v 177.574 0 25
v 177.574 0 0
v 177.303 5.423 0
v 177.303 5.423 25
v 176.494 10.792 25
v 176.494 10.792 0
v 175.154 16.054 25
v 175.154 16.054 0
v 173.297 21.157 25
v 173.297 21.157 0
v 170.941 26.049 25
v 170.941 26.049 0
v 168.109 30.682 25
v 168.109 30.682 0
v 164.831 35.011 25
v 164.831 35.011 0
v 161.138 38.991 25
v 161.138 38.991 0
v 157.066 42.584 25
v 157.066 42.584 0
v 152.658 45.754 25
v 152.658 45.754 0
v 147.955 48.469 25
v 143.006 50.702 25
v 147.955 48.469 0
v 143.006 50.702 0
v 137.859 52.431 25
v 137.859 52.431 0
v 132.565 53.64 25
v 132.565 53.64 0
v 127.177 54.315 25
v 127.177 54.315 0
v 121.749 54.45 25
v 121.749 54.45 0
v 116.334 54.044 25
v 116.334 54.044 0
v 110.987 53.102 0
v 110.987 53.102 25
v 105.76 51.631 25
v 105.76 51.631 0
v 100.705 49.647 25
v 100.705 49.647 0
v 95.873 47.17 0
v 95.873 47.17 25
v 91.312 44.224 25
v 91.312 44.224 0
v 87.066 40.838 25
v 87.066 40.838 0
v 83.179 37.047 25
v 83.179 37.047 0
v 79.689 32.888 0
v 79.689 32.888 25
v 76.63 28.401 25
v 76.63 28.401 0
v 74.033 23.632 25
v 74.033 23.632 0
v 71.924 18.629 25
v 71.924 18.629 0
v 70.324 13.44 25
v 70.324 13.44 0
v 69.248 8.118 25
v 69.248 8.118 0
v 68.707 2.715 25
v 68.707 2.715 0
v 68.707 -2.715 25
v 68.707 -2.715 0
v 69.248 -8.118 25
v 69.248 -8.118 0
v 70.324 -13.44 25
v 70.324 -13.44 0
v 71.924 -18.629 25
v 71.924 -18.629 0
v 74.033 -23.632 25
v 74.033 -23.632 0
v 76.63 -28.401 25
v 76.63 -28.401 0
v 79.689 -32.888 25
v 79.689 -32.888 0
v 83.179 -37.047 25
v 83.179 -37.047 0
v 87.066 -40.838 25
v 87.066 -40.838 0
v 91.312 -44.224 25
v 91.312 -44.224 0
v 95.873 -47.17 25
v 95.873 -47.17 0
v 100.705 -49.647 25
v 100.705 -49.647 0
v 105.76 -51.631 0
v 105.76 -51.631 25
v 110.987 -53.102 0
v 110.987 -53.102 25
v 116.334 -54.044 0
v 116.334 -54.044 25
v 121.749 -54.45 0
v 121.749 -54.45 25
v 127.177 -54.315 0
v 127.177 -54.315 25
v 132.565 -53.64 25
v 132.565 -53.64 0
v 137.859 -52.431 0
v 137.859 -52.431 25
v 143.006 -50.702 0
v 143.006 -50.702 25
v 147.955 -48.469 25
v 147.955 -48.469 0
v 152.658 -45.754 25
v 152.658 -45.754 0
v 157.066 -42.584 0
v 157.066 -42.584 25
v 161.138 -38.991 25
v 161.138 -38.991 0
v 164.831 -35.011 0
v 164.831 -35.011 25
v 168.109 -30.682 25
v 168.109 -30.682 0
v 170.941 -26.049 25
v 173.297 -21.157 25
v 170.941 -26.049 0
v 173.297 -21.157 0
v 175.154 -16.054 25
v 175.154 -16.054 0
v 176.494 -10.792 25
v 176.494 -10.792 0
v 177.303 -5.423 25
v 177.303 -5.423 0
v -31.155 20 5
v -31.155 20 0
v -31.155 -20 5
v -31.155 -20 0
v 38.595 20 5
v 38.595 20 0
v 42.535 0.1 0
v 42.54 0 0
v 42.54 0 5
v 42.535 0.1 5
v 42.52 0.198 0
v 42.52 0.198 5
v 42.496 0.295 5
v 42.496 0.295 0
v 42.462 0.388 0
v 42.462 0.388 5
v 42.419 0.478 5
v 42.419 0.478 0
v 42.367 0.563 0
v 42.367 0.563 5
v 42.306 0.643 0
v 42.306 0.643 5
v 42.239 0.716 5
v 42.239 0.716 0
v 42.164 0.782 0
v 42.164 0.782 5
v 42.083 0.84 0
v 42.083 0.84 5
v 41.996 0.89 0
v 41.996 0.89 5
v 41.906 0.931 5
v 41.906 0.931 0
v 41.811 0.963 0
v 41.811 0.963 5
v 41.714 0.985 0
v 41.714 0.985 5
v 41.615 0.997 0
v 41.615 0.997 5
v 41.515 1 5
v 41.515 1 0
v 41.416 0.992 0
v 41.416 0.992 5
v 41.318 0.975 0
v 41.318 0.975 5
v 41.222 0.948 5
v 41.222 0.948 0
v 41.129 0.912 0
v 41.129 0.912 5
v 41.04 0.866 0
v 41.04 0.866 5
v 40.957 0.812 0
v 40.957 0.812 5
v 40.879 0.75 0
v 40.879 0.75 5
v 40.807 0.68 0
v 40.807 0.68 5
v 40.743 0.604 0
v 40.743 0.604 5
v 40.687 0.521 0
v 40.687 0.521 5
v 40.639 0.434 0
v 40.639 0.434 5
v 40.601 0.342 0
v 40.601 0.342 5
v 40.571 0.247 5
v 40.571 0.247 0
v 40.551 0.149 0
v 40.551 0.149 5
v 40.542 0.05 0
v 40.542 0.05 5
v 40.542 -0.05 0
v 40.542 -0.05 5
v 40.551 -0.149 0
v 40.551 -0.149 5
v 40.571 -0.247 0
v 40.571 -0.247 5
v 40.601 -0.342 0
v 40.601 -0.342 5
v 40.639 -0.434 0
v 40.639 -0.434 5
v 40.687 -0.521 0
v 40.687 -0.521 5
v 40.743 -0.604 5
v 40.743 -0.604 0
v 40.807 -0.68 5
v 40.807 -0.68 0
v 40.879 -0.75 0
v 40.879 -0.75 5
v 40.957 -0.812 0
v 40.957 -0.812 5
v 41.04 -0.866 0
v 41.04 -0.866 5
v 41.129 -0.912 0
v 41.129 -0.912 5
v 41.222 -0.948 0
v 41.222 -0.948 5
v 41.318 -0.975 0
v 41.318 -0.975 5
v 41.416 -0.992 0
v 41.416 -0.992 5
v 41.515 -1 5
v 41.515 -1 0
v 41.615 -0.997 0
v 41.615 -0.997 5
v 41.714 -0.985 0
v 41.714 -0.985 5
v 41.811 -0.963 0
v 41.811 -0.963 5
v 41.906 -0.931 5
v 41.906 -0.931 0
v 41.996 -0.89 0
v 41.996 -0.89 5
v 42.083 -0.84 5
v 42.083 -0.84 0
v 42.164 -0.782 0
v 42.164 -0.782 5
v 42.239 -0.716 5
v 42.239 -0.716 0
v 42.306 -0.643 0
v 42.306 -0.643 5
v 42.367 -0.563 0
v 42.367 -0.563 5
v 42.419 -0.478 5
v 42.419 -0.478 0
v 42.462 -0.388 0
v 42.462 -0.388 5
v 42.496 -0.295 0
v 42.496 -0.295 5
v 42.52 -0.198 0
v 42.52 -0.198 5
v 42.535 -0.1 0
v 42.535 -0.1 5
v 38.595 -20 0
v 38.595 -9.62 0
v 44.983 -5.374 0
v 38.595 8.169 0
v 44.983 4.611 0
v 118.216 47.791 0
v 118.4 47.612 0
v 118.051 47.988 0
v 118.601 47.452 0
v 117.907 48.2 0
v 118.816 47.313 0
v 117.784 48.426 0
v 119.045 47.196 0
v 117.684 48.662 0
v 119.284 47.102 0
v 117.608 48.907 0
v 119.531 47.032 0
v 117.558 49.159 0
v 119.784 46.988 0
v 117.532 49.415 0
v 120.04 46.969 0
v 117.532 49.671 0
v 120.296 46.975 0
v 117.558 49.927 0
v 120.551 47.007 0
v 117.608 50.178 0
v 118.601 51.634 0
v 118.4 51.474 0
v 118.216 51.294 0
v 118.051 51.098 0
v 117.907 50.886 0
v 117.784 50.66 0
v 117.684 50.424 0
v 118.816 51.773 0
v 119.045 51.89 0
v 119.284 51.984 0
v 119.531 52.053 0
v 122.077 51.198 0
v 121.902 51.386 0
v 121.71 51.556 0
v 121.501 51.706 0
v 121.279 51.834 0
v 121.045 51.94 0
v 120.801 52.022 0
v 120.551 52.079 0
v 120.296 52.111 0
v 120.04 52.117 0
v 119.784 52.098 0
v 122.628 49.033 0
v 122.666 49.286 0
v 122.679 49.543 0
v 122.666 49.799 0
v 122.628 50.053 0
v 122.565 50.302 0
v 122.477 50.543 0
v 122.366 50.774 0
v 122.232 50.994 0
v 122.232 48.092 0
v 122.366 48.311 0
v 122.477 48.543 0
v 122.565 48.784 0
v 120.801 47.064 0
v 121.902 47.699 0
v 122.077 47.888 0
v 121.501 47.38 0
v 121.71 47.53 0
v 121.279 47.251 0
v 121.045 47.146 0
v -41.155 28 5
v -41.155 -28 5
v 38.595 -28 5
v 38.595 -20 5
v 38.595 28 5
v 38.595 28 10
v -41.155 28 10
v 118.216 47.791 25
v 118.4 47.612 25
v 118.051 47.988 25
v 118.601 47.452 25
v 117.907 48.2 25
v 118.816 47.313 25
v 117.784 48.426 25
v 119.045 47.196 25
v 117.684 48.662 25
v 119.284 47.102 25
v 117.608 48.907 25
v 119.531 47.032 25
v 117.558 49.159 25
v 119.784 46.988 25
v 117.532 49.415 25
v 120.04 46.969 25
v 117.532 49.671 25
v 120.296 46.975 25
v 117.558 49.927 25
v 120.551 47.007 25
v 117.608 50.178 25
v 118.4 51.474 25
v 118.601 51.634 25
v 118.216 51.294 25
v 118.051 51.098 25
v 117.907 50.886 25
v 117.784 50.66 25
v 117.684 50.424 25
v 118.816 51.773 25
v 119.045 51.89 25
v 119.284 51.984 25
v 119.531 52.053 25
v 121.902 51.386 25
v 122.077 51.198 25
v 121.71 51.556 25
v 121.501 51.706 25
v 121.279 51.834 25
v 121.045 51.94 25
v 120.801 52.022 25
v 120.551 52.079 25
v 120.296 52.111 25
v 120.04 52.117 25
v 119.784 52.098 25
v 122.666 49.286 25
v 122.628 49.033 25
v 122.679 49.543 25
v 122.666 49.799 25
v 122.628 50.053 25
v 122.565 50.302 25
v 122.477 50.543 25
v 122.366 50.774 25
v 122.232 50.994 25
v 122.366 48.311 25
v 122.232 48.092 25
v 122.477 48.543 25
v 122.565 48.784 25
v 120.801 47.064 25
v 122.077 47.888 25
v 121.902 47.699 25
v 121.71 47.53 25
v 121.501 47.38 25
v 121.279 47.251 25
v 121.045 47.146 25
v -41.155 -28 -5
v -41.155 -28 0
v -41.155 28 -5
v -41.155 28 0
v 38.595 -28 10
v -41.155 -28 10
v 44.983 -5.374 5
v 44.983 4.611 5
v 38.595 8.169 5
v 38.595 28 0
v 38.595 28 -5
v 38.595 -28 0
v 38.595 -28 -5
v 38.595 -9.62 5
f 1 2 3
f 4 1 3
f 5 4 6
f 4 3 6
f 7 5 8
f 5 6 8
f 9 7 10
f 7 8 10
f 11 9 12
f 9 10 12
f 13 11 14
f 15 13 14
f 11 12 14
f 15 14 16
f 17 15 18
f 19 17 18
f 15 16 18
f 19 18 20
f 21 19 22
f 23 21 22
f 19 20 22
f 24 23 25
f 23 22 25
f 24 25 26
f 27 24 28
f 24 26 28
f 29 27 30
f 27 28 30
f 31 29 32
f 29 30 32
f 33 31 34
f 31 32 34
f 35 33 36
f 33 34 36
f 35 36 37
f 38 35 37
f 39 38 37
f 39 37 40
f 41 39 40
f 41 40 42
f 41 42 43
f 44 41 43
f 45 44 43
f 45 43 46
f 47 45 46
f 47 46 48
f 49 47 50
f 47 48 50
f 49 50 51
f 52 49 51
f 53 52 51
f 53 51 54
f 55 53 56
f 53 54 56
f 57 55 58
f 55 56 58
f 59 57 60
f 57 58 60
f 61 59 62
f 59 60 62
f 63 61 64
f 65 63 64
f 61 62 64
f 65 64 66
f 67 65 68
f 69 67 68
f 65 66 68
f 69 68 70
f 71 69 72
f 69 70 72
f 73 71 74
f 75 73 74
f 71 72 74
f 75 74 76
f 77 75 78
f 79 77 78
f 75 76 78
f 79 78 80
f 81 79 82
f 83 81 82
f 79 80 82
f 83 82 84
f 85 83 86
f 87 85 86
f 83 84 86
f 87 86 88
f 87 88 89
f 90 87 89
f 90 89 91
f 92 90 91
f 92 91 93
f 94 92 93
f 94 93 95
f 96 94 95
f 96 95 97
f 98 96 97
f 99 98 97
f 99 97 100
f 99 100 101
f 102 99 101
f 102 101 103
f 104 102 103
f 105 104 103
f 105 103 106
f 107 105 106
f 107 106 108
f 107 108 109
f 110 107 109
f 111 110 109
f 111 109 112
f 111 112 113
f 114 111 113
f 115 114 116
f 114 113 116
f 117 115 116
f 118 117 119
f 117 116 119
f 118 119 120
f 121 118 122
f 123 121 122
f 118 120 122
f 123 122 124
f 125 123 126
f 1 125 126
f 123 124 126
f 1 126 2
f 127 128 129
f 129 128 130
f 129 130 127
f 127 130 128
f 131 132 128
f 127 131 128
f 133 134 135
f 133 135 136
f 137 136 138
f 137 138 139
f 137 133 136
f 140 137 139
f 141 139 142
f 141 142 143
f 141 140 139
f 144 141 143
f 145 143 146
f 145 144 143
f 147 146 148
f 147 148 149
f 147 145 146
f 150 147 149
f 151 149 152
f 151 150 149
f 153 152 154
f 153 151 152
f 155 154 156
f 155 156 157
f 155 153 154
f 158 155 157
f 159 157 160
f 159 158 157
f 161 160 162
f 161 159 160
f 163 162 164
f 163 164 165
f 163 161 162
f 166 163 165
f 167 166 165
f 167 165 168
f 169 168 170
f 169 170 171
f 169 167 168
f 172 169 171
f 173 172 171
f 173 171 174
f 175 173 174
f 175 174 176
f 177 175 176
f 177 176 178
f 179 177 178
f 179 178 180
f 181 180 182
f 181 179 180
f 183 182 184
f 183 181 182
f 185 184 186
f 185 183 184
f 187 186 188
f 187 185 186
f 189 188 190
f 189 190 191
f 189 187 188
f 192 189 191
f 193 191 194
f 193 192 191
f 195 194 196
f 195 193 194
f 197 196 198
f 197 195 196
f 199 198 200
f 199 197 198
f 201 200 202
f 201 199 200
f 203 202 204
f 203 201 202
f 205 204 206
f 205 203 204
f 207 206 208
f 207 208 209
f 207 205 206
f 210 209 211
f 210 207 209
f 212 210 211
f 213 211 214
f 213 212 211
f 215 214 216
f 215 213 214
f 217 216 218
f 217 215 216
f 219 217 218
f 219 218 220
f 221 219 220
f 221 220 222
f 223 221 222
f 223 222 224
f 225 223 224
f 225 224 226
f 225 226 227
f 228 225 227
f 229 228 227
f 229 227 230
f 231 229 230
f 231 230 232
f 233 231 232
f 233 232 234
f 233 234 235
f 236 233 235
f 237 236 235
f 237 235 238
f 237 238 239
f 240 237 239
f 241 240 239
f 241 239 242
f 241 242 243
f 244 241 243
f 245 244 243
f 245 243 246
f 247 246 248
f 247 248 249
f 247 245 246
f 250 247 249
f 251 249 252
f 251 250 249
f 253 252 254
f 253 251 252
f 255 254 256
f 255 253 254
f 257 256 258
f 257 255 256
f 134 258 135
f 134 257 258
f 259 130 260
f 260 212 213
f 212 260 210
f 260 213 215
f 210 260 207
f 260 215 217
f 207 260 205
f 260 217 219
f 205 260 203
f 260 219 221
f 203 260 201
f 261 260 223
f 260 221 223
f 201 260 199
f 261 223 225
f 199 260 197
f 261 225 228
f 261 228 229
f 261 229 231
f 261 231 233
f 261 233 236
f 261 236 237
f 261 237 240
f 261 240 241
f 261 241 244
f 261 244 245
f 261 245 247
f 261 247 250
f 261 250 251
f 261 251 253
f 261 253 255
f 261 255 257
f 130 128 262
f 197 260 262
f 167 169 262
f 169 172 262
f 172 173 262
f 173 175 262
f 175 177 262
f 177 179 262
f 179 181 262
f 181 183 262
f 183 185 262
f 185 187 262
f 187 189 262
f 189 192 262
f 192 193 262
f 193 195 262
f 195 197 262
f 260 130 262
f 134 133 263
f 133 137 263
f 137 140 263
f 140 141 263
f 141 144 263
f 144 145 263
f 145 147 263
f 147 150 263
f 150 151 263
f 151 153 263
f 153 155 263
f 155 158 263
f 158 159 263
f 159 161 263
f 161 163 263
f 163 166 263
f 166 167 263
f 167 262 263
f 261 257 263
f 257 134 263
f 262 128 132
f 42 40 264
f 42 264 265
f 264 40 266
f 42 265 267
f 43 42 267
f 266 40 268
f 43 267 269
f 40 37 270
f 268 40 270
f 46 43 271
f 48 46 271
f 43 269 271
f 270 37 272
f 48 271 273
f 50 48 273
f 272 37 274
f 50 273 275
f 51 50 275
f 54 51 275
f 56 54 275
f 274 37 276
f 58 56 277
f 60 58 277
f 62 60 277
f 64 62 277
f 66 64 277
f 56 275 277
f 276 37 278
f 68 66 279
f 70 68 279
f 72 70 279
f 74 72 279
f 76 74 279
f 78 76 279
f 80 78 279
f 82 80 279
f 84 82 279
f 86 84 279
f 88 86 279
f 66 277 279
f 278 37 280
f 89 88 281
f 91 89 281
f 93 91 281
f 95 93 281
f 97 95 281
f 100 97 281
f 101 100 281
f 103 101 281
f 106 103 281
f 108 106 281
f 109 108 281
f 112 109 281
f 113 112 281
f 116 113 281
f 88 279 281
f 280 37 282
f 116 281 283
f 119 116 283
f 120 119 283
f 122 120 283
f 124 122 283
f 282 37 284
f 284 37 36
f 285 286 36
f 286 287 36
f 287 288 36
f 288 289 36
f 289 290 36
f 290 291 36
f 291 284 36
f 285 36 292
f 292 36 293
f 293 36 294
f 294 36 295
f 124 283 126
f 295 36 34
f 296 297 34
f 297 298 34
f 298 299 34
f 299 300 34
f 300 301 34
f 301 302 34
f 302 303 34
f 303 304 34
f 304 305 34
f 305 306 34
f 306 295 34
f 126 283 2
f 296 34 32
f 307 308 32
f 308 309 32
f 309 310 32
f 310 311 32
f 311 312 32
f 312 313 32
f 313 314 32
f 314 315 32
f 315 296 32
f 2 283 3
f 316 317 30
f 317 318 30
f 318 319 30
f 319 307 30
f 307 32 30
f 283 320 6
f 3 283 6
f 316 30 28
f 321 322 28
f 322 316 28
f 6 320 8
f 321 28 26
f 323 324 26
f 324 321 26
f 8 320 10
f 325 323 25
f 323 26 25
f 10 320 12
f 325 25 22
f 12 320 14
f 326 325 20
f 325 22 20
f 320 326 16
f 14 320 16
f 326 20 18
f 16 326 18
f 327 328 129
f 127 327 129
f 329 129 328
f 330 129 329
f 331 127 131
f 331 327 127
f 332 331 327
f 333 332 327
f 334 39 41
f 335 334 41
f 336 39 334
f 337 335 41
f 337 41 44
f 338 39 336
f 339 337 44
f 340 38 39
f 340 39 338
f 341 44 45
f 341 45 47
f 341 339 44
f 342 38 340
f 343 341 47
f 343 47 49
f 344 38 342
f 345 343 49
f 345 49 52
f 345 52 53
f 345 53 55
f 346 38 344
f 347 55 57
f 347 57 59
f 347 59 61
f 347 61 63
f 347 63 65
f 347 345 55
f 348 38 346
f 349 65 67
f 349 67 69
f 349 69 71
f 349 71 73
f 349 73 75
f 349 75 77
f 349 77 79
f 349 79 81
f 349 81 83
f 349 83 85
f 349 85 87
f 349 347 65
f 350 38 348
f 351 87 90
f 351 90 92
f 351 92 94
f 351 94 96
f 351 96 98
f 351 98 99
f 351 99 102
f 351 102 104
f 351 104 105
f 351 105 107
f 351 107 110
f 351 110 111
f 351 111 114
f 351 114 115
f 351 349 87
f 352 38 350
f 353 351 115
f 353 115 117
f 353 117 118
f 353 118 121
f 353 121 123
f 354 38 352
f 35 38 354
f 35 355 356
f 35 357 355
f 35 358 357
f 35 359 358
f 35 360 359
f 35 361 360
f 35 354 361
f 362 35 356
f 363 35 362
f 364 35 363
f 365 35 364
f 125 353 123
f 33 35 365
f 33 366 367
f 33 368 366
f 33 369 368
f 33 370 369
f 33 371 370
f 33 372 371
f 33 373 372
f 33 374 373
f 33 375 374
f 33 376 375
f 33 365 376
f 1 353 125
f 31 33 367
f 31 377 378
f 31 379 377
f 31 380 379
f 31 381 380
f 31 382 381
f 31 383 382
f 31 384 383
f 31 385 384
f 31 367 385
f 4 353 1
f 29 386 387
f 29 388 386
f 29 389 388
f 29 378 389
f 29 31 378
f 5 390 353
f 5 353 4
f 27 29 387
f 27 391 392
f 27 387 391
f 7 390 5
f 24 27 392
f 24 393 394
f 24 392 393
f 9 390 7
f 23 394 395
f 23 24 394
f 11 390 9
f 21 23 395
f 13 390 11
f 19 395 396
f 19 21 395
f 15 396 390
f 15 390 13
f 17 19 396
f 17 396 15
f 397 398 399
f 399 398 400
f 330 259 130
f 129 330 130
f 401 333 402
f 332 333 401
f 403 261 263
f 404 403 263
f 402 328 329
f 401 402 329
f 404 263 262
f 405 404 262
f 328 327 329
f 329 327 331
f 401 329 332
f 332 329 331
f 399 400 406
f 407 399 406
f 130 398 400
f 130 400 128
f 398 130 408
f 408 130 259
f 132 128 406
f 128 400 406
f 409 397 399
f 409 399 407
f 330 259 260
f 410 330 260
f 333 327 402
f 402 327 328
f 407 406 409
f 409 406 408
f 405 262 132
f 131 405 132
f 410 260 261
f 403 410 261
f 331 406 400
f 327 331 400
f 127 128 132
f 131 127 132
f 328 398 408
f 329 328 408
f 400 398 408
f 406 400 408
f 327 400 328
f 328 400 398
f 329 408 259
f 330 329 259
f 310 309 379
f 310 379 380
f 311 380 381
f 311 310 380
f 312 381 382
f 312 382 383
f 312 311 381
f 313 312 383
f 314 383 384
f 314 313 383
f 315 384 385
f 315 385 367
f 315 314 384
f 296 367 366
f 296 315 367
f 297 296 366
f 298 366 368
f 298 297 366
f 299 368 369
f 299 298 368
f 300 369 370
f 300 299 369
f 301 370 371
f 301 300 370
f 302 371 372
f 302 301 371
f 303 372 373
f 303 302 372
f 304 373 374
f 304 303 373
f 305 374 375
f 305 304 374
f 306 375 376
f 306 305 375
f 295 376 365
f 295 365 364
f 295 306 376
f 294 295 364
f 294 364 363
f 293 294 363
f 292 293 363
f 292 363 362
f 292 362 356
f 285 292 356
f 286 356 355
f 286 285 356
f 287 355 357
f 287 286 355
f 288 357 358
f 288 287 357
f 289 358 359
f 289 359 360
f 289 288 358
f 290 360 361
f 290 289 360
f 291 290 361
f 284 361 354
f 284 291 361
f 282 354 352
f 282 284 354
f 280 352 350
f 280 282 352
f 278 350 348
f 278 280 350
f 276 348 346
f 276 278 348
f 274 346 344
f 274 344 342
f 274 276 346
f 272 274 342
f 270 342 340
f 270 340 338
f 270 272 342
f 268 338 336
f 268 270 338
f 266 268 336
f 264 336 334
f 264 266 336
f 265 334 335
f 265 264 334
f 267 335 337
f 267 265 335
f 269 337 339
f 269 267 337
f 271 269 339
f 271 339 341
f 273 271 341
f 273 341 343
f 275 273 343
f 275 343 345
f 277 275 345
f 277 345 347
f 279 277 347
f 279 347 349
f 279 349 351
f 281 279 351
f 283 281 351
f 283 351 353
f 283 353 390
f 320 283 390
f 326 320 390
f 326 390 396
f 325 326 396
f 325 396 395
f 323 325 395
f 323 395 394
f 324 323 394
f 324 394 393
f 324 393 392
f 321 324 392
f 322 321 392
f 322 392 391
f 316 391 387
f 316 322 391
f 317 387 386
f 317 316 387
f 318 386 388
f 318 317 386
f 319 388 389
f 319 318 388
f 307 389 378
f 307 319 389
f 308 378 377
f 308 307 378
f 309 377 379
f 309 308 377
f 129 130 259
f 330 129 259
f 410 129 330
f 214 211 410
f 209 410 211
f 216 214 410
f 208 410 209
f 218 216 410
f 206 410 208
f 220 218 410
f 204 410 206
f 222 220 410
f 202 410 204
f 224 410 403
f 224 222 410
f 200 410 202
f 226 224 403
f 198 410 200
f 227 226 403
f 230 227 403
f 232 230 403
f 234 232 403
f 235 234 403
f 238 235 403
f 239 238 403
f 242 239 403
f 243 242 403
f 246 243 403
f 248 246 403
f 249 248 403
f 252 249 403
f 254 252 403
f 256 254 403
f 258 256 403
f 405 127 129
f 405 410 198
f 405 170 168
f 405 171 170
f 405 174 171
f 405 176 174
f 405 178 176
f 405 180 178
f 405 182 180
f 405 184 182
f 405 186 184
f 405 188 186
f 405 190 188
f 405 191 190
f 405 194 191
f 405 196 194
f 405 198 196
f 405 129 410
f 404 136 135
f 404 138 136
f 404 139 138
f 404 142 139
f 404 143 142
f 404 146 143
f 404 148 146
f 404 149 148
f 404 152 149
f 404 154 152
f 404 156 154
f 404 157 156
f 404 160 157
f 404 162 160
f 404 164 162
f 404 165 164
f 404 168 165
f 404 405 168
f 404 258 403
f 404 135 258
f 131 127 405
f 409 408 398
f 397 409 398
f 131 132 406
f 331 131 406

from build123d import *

# Parameters (mm, degrees)
F0_R     = 1
F1_DEPTH = 5
F2_DEPTH = 5
F4_DEPTH = 5
F6_DEPTH = 5
F7_R     = 54.467191
F7_R_2   = 2.575131
F8_DEPTH = 25


with BuildPart() as f1:
    # F0 (on Top) → F1 (new body)
    with BuildSketch(Plane.XY):
        Polygon((38.59535, 20), (-31.154648, 20), (-31.154648, -20), (38.59535, -20), (38.59535, -9.620124), (38.59535, 8.16877), align=None)
        Polygon((44.983294, 4.610992), (38.59535, 8.16877), (38.59535, -9.620124), (44.983294, -5.373743), align=None)
        with Locations((41.54028, 0)):
            Circle(F0_R, mode=Mode.SUBTRACT)
    extrude(amount=F1_DEPTH)


with BuildPart() as f2:
    # F0 (on Top) → F2 (new body)
    with BuildSketch(Plane.XY):
        Polygon((-31.154648, -20), (-31.154648, 20), (38.59535, 20), (38.59535, 28), (-41.154651, 28), (-41.154651, -28), (38.59535, -28), (38.59535, -20), align=None)
    extrude(amount=F2_DEPTH)


with BuildPart() as f4:
    # F3 (on face) → F4 (new body)
    with BuildSketch(Plane(origin=(0, 0, 0), x_dir=(1, 0, 0), z_dir=(0, 0, -1))):
        Polygon((38.59535, 20), (38.59535, 28), (-41.154651, 28), (-41.154651, -28), (38.59535, -28), (38.59535, -20), align=None)
    extrude(amount=F4_DEPTH)


with BuildPart() as f6:
    # F5 (on face) → F6 (new body)
    with BuildSketch(Plane.XY.offset(5)):
        Polygon((-41.154651, 28), (-41.154651, -28), (38.59535, -28), (38.59535, -20), (38.59535, 20), (38.59535, 28), align=None)
    extrude(amount=F6_DEPTH)


with BuildPart() as f8:
    # F7 (on Top) → F8 (new body)
    with BuildSketch(Plane.XY):
        with Locations((123.106591, 0)):
            Circle(F7_R)
        with Locations((120.103993, 49.542896)):
            Circle(F7_R_2, mode=Mode.SUBTRACT)
    extrude(amount=F8_DEPTH)


solid = Compound([f1.part, f2.part, f4.part, f6.part, f8.part])
